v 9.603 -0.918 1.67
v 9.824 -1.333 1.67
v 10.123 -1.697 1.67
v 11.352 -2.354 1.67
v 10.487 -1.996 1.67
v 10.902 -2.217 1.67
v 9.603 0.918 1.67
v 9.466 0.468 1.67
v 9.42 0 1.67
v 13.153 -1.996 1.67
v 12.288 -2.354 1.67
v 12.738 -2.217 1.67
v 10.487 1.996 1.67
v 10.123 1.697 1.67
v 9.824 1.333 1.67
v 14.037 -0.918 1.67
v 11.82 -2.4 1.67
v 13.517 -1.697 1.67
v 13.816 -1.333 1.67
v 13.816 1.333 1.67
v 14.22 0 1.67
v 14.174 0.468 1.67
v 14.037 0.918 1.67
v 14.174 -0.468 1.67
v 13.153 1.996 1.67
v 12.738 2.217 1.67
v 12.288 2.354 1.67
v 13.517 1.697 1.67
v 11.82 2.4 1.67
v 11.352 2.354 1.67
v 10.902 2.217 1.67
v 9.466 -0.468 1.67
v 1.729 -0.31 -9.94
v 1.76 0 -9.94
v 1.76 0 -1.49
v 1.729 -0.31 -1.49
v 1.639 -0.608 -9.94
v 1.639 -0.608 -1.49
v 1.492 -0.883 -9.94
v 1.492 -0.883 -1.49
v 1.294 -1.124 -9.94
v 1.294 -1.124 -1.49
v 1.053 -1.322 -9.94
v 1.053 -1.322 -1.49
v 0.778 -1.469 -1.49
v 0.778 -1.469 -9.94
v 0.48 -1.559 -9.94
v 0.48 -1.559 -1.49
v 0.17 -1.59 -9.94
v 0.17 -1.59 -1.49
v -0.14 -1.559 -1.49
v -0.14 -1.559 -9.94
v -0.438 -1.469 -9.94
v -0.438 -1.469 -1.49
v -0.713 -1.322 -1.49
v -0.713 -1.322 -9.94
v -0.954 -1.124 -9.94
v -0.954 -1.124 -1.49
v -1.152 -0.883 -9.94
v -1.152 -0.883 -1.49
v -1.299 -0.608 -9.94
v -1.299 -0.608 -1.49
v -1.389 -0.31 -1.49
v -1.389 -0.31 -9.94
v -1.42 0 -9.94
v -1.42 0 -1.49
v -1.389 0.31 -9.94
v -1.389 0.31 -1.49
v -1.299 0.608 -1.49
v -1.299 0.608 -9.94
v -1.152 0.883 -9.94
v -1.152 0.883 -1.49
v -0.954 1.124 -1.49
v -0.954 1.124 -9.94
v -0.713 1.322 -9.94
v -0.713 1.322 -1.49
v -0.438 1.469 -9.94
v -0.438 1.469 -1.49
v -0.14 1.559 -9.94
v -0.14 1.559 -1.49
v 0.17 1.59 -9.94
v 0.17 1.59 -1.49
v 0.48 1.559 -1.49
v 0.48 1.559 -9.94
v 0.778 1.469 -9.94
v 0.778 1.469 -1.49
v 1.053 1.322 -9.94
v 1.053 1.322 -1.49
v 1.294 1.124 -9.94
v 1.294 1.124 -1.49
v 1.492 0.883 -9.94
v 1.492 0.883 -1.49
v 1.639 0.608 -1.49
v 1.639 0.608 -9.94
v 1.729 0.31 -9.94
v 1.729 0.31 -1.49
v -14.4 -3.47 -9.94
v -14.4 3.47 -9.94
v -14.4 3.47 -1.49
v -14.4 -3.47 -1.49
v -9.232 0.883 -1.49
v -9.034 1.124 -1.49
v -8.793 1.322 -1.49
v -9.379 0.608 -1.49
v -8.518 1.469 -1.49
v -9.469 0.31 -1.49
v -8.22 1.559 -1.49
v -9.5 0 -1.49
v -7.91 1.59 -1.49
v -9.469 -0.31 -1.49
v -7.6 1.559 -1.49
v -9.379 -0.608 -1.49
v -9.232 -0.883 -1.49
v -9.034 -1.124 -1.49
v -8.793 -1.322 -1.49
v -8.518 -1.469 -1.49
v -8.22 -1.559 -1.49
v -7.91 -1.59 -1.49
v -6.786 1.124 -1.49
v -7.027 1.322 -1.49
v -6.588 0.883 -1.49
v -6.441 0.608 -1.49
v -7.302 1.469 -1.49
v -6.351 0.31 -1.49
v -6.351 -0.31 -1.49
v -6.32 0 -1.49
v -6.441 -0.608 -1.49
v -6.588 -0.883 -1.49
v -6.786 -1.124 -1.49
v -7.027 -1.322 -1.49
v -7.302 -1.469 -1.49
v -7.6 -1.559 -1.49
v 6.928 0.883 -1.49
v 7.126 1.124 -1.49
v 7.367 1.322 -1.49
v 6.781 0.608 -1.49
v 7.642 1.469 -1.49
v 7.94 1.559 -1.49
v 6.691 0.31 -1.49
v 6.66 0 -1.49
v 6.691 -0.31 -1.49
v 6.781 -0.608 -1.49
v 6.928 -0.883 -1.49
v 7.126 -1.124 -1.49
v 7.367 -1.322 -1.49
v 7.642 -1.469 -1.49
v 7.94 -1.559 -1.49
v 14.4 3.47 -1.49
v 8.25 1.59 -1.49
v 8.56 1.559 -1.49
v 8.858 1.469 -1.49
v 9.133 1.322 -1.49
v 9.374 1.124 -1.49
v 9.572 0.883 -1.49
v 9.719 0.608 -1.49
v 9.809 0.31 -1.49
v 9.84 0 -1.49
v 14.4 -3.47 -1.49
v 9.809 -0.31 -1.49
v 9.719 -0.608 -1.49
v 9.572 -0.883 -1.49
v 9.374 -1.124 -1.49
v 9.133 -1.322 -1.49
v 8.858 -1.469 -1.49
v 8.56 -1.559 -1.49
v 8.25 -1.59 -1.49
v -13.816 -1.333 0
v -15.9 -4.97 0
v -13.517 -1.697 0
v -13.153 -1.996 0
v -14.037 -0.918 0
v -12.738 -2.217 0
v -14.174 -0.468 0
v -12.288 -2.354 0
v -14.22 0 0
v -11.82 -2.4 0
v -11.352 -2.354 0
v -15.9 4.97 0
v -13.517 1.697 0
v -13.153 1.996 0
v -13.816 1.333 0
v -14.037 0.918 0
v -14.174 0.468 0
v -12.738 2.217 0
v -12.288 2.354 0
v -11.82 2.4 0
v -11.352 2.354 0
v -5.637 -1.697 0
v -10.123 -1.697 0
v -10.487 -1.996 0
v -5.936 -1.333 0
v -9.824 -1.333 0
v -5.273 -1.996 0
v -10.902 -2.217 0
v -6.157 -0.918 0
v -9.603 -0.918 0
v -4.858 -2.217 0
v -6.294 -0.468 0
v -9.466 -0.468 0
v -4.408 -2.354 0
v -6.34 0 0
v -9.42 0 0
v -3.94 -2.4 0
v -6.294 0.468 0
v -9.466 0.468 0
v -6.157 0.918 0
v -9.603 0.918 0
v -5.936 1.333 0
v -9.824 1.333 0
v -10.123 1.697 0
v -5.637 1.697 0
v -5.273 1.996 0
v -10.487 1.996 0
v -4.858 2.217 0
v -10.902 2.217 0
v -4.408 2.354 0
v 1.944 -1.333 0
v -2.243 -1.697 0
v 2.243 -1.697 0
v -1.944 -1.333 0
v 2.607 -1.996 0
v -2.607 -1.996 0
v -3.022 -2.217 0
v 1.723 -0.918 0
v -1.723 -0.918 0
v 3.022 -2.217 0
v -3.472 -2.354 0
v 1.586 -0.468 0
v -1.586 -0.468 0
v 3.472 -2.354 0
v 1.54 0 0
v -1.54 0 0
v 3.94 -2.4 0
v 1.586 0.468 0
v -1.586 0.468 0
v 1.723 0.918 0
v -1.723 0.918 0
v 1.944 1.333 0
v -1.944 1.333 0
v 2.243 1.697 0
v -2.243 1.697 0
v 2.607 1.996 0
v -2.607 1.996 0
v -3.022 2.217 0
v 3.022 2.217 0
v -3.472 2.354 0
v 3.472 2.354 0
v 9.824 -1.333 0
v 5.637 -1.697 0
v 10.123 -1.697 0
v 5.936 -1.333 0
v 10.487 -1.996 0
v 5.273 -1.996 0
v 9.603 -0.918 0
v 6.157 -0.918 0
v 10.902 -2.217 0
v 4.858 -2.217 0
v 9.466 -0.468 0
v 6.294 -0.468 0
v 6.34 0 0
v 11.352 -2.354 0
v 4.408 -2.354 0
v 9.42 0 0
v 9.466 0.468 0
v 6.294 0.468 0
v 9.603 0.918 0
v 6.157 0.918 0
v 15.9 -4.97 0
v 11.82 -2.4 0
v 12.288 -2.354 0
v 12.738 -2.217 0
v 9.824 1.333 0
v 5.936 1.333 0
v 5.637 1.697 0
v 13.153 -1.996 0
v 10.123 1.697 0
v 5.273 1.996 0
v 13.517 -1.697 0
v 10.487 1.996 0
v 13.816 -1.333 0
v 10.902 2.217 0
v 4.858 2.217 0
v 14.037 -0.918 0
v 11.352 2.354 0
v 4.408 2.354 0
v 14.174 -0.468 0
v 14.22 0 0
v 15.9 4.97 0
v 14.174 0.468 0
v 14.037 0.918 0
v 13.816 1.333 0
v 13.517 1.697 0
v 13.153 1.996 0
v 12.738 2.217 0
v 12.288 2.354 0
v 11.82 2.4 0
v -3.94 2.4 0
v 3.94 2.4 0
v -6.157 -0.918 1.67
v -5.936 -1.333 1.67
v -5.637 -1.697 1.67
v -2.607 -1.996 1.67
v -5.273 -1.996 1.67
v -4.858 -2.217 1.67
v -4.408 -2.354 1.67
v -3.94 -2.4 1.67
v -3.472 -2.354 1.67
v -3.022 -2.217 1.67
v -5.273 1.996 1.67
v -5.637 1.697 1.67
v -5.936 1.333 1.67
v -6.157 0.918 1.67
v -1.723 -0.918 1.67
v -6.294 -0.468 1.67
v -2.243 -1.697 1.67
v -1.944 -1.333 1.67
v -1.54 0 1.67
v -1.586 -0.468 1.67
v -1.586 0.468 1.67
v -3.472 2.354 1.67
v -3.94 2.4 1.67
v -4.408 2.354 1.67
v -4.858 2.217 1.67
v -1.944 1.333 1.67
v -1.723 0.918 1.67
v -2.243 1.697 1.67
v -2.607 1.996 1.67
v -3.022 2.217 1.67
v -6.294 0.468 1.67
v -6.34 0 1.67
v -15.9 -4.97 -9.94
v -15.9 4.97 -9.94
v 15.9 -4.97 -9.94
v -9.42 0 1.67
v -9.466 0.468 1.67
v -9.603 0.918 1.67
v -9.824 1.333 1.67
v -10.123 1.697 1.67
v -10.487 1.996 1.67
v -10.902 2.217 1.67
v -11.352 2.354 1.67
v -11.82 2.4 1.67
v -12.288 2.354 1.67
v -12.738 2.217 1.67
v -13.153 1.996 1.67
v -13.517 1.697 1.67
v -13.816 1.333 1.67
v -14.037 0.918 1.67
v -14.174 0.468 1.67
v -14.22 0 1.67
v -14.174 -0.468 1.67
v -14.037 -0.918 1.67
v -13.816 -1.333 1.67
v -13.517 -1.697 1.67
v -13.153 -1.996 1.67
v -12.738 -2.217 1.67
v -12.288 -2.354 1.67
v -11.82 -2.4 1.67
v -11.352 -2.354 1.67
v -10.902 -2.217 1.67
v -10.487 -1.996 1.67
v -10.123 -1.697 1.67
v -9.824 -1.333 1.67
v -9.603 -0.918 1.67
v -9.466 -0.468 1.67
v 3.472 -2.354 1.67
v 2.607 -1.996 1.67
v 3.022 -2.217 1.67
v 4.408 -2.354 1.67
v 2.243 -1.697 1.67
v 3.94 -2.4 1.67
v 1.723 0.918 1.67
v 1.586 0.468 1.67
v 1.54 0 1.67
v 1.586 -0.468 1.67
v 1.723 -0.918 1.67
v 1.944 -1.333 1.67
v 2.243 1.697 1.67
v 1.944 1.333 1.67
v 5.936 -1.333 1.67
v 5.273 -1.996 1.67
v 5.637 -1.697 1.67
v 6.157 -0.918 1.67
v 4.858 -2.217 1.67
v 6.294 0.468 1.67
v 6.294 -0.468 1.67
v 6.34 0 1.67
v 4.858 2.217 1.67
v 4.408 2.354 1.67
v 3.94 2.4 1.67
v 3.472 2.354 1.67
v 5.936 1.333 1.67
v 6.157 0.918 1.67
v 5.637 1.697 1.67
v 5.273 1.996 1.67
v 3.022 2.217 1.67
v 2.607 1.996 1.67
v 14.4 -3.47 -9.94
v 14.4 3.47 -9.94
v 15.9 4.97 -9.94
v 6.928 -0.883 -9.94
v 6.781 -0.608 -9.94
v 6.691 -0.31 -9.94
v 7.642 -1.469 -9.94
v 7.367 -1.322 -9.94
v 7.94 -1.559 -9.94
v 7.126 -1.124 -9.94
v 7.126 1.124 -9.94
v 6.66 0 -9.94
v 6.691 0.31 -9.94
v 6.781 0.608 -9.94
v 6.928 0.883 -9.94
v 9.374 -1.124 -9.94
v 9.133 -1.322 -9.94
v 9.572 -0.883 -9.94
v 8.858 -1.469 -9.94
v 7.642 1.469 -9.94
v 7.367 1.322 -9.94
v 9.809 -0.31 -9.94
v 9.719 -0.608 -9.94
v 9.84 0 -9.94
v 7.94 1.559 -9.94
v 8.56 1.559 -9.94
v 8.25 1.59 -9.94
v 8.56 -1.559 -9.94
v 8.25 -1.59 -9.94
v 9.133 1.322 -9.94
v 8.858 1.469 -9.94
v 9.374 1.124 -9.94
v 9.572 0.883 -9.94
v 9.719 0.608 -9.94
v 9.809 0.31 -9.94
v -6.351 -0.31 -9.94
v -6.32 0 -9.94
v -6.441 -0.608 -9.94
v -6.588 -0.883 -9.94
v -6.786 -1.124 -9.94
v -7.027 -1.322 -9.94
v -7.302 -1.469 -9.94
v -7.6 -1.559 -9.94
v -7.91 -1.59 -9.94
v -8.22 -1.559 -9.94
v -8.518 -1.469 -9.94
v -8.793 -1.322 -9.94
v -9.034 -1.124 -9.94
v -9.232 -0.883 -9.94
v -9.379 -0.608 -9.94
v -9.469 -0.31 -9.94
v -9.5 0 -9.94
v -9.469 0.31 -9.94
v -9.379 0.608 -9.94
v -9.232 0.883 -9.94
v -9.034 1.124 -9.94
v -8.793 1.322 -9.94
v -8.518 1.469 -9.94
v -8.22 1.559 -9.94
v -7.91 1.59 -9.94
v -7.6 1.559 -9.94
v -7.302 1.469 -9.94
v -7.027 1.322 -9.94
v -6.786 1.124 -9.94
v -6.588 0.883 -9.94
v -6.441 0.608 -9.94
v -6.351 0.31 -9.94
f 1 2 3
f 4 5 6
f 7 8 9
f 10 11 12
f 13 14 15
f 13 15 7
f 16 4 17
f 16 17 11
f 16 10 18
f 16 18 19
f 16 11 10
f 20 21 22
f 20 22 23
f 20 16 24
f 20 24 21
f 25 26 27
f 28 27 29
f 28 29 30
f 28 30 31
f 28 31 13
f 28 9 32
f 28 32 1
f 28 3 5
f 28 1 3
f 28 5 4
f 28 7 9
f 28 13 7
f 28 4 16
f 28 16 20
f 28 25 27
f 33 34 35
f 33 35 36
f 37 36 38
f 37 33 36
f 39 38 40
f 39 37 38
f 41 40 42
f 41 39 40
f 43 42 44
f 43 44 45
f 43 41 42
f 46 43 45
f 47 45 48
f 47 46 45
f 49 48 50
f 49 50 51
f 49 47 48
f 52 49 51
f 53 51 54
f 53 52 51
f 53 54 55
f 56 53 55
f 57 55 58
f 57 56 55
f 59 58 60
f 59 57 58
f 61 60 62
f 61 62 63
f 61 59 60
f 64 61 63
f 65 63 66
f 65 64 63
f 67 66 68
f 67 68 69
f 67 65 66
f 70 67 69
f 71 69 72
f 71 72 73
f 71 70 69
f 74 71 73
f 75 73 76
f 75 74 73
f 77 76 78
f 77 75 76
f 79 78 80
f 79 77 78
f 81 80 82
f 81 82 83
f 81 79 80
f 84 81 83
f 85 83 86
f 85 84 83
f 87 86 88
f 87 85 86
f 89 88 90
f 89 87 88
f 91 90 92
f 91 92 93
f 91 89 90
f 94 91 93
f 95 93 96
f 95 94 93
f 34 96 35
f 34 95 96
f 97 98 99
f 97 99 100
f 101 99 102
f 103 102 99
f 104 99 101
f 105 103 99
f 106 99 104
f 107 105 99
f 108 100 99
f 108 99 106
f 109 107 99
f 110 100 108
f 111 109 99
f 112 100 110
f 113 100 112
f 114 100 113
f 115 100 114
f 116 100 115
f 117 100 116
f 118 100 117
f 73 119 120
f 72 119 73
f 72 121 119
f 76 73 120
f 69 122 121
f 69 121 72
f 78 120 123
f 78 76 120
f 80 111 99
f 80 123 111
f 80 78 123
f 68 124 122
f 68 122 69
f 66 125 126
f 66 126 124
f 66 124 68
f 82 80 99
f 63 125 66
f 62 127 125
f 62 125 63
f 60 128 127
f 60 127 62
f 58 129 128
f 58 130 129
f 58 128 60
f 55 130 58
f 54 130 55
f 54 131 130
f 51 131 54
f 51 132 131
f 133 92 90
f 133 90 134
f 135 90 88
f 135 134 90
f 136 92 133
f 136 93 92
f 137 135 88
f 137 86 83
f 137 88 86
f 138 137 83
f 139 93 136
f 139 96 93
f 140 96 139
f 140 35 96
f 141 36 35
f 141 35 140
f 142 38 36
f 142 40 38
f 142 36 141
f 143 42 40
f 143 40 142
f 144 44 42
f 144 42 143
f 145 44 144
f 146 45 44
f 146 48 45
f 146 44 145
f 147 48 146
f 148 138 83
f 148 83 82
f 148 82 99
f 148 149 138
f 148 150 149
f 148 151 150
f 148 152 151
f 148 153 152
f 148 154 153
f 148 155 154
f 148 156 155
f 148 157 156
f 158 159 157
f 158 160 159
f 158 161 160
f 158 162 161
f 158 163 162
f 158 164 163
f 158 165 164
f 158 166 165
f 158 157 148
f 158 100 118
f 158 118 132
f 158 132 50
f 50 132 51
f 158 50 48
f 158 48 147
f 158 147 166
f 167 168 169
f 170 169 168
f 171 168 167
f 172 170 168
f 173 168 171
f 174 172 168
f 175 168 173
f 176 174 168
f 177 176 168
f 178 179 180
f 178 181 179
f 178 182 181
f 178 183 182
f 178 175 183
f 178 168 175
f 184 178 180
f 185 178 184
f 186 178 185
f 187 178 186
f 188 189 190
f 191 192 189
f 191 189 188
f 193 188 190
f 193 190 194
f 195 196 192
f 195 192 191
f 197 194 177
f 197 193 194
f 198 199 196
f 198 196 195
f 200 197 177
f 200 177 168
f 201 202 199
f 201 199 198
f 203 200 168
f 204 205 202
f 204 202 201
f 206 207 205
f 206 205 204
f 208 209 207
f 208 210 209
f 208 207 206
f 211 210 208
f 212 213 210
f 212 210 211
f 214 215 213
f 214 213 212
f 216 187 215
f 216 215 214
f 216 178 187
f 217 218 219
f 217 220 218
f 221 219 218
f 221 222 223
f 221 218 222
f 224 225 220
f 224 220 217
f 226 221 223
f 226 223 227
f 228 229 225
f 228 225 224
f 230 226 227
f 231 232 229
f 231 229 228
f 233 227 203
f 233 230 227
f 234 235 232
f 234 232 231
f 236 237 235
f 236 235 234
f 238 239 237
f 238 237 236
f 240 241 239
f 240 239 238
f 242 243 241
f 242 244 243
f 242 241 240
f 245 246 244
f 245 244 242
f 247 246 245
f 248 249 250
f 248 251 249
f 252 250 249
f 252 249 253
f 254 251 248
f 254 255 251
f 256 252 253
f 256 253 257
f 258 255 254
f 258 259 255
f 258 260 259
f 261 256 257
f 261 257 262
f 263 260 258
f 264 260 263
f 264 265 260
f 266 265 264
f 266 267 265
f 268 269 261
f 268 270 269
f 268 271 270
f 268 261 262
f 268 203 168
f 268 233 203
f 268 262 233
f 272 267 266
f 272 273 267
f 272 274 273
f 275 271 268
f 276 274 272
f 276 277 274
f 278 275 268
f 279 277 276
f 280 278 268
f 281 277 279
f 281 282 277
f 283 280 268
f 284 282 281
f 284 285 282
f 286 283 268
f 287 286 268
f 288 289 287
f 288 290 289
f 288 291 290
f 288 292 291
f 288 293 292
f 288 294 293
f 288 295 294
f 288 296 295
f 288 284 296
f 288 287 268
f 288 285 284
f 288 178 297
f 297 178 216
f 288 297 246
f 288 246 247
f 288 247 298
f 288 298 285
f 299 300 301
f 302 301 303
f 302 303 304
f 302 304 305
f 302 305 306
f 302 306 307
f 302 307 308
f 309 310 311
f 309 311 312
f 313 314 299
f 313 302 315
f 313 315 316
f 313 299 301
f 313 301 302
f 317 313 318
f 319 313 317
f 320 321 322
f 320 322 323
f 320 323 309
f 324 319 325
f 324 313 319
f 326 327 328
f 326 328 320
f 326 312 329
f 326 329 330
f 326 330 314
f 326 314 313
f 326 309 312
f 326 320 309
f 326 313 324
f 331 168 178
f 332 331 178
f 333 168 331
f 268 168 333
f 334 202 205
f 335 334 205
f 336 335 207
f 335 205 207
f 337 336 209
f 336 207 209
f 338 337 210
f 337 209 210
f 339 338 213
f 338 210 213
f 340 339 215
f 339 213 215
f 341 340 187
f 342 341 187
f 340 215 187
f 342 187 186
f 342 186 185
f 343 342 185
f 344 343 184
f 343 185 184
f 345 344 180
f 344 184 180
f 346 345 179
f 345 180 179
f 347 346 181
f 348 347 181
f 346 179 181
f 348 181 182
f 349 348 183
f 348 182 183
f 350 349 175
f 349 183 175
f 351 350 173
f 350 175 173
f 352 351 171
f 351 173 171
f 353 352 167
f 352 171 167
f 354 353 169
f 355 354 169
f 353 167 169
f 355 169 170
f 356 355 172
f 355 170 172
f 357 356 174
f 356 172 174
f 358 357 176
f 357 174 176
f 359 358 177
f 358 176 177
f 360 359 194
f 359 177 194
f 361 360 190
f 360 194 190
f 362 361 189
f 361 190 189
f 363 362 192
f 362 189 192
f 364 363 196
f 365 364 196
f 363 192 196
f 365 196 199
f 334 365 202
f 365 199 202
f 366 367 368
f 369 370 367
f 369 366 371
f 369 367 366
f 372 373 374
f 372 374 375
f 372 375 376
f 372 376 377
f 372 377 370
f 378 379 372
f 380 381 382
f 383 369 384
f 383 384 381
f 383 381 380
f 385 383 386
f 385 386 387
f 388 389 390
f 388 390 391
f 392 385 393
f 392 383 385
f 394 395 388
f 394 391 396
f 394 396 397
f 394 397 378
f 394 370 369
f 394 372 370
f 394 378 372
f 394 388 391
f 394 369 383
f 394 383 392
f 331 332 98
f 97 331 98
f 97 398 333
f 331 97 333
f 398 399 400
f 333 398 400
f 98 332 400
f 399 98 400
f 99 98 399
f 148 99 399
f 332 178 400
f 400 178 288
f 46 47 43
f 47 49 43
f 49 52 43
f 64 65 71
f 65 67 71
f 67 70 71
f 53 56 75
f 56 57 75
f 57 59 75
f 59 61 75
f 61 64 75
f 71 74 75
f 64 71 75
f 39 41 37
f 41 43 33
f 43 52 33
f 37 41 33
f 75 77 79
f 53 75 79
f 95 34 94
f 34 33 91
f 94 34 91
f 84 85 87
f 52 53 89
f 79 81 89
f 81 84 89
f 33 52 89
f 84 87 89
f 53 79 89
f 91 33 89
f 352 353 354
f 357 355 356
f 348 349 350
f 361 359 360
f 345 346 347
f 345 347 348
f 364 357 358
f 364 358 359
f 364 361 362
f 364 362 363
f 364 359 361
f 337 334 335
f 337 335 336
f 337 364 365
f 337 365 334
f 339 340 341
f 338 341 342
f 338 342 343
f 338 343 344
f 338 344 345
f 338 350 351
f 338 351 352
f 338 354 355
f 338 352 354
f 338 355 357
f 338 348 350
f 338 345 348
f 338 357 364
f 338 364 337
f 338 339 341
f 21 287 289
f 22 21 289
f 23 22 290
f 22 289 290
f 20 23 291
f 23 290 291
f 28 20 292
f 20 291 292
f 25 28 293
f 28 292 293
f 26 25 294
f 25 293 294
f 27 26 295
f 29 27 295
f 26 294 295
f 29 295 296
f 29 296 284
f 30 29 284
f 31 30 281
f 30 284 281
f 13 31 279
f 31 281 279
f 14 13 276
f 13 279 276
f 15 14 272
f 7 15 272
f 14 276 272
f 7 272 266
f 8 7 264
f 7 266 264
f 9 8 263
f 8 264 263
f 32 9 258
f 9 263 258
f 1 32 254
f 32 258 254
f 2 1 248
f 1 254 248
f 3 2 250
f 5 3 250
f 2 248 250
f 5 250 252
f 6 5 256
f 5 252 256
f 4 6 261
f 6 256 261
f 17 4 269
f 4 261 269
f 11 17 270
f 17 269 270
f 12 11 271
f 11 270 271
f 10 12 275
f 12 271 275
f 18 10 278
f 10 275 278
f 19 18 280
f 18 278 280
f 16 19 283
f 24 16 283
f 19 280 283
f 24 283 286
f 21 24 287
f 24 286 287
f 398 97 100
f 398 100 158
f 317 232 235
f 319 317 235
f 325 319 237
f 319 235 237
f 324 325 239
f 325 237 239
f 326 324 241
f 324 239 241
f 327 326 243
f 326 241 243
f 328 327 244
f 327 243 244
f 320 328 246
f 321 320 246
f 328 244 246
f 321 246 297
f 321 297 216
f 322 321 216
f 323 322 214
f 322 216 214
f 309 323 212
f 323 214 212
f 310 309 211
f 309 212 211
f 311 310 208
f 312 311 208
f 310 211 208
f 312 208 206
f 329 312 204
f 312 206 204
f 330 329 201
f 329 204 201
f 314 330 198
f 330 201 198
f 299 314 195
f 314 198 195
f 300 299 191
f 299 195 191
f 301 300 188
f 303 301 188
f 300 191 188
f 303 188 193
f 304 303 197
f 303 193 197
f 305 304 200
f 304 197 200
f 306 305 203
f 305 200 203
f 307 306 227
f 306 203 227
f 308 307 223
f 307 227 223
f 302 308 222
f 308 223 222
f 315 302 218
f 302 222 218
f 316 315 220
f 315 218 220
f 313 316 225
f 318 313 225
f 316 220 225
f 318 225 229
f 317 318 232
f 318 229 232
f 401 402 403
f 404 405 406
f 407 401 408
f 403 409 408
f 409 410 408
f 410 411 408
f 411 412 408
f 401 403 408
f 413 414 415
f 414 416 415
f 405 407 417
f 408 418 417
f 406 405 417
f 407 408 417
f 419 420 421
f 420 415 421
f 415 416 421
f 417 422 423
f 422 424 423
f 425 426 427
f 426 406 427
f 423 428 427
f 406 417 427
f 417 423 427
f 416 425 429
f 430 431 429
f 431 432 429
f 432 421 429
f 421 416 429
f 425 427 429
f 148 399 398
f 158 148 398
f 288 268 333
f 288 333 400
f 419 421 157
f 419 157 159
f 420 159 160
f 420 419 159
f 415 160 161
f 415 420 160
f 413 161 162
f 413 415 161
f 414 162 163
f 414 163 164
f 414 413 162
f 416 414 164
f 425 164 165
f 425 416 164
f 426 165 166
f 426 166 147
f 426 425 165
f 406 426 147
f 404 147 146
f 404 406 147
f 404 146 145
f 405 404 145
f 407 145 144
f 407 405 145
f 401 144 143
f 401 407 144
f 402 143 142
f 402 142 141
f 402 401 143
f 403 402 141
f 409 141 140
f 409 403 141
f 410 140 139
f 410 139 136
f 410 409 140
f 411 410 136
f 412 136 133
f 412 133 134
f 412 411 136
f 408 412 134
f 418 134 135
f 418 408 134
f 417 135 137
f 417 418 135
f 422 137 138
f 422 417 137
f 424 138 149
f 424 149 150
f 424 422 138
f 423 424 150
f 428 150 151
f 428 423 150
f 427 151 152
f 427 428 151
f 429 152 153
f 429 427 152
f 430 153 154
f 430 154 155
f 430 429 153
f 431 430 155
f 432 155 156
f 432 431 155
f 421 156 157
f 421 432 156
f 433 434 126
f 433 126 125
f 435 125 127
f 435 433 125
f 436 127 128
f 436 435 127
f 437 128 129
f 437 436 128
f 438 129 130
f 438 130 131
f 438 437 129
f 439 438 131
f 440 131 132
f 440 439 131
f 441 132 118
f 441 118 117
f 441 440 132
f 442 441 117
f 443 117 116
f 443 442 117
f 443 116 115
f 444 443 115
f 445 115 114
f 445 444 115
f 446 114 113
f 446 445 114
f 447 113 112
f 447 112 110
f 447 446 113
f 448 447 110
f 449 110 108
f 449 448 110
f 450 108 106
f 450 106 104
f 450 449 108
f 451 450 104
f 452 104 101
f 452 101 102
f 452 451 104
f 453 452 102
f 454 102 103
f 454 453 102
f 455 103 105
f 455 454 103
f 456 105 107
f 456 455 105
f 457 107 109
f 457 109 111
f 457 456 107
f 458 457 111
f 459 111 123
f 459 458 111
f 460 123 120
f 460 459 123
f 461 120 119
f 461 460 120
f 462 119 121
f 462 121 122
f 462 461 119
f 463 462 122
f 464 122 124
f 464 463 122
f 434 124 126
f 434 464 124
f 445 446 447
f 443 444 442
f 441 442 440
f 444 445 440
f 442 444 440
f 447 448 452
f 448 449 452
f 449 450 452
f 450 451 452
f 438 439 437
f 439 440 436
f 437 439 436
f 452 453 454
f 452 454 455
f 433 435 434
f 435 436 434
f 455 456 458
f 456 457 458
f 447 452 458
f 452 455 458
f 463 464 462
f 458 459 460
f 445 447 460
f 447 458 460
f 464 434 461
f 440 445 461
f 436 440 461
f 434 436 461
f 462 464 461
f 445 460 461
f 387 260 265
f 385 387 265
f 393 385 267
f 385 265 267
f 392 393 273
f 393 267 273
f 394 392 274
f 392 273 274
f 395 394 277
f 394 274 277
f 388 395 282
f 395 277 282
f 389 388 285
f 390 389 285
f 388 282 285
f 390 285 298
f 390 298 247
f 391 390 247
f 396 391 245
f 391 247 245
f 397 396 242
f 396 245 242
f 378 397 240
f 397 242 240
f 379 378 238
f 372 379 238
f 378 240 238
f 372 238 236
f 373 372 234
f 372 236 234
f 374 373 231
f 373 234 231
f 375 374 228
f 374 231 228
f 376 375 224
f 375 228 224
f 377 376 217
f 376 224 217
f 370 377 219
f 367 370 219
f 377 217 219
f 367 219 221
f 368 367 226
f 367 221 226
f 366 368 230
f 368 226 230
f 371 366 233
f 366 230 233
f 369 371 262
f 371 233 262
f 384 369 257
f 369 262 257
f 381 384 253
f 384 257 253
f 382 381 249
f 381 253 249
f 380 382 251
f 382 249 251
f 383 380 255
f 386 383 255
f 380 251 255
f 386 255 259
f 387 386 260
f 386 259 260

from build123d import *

# Parameters (mm, degrees)
F0_W     = 31.8
F0_H     = 9.94
F0_R     = 2.4
F1_DEPTH = 9.94
F2_DEPTH = 1.67
F3_W     = 28.8
F3_H     = 6.94
F3_R     = 1.59
F4_DEPTH = 8.45


with BuildPart() as f1:
    # F0 (on Top) → F1 (new body)
    with BuildSketch(Plane.XY):
        Rectangle(F0_W, F0_H)
        with Locations((-11.82, 0)):
            Circle(F0_R, mode=Mode.SUBTRACT)
        with Locations((-3.94, 0)):
            Circle(F0_R, mode=Mode.SUBTRACT)
        with Locations((3.94, 0)):
            Circle(F0_R, mode=Mode.SUBTRACT)
        with Locations((11.82, 0)):
            Circle(F0_R, mode=Mode.SUBTRACT)
        with Locations((-11.82, 0)):
            Circle(F0_R)
        with Locations((-3.94, 0)):
            Circle(F0_R)
        with Locations((3.94, 0)):
            Circle(F0_R)
        with Locations((11.82, 0)):
            Circle(F0_R)
    extrude(amount=-F1_DEPTH)

    # F0 (on Top) → F2 (join)
    with BuildSketch(Plane.XY):
        with Locations((-11.82, 0)):
            Circle(F0_R)
        with Locations((-3.94, 0)):
            Circle(F0_R)
        with Locations((3.94, 0)):
            Circle(F0_R)
        with Locations((11.82, 0)):
            Circle(F0_R)
    extrude(amount=F2_DEPTH)

    # F3 (on face) → F4 (cut)
    with BuildSketch(Plane(origin=(0, 0, -9.94), x_dir=(1, 0, 0), z_dir=(0, 0, -1))):
        Rectangle(F3_W, F3_H)
        with Locations((-7.91, 0)):
            Circle(F3_R, mode=Mode.SUBTRACT)
        with Locations((0.17, 0)):
            Circle(F3_R, mode=Mode.SUBTRACT)
        with Locations((8.25, 0)):
            Circle(F3_R, mode=Mode.SUBTRACT)
    extrude(amount=-F4_DEPTH, mode=Mode.SUBTRACT)


solid = f1.part
